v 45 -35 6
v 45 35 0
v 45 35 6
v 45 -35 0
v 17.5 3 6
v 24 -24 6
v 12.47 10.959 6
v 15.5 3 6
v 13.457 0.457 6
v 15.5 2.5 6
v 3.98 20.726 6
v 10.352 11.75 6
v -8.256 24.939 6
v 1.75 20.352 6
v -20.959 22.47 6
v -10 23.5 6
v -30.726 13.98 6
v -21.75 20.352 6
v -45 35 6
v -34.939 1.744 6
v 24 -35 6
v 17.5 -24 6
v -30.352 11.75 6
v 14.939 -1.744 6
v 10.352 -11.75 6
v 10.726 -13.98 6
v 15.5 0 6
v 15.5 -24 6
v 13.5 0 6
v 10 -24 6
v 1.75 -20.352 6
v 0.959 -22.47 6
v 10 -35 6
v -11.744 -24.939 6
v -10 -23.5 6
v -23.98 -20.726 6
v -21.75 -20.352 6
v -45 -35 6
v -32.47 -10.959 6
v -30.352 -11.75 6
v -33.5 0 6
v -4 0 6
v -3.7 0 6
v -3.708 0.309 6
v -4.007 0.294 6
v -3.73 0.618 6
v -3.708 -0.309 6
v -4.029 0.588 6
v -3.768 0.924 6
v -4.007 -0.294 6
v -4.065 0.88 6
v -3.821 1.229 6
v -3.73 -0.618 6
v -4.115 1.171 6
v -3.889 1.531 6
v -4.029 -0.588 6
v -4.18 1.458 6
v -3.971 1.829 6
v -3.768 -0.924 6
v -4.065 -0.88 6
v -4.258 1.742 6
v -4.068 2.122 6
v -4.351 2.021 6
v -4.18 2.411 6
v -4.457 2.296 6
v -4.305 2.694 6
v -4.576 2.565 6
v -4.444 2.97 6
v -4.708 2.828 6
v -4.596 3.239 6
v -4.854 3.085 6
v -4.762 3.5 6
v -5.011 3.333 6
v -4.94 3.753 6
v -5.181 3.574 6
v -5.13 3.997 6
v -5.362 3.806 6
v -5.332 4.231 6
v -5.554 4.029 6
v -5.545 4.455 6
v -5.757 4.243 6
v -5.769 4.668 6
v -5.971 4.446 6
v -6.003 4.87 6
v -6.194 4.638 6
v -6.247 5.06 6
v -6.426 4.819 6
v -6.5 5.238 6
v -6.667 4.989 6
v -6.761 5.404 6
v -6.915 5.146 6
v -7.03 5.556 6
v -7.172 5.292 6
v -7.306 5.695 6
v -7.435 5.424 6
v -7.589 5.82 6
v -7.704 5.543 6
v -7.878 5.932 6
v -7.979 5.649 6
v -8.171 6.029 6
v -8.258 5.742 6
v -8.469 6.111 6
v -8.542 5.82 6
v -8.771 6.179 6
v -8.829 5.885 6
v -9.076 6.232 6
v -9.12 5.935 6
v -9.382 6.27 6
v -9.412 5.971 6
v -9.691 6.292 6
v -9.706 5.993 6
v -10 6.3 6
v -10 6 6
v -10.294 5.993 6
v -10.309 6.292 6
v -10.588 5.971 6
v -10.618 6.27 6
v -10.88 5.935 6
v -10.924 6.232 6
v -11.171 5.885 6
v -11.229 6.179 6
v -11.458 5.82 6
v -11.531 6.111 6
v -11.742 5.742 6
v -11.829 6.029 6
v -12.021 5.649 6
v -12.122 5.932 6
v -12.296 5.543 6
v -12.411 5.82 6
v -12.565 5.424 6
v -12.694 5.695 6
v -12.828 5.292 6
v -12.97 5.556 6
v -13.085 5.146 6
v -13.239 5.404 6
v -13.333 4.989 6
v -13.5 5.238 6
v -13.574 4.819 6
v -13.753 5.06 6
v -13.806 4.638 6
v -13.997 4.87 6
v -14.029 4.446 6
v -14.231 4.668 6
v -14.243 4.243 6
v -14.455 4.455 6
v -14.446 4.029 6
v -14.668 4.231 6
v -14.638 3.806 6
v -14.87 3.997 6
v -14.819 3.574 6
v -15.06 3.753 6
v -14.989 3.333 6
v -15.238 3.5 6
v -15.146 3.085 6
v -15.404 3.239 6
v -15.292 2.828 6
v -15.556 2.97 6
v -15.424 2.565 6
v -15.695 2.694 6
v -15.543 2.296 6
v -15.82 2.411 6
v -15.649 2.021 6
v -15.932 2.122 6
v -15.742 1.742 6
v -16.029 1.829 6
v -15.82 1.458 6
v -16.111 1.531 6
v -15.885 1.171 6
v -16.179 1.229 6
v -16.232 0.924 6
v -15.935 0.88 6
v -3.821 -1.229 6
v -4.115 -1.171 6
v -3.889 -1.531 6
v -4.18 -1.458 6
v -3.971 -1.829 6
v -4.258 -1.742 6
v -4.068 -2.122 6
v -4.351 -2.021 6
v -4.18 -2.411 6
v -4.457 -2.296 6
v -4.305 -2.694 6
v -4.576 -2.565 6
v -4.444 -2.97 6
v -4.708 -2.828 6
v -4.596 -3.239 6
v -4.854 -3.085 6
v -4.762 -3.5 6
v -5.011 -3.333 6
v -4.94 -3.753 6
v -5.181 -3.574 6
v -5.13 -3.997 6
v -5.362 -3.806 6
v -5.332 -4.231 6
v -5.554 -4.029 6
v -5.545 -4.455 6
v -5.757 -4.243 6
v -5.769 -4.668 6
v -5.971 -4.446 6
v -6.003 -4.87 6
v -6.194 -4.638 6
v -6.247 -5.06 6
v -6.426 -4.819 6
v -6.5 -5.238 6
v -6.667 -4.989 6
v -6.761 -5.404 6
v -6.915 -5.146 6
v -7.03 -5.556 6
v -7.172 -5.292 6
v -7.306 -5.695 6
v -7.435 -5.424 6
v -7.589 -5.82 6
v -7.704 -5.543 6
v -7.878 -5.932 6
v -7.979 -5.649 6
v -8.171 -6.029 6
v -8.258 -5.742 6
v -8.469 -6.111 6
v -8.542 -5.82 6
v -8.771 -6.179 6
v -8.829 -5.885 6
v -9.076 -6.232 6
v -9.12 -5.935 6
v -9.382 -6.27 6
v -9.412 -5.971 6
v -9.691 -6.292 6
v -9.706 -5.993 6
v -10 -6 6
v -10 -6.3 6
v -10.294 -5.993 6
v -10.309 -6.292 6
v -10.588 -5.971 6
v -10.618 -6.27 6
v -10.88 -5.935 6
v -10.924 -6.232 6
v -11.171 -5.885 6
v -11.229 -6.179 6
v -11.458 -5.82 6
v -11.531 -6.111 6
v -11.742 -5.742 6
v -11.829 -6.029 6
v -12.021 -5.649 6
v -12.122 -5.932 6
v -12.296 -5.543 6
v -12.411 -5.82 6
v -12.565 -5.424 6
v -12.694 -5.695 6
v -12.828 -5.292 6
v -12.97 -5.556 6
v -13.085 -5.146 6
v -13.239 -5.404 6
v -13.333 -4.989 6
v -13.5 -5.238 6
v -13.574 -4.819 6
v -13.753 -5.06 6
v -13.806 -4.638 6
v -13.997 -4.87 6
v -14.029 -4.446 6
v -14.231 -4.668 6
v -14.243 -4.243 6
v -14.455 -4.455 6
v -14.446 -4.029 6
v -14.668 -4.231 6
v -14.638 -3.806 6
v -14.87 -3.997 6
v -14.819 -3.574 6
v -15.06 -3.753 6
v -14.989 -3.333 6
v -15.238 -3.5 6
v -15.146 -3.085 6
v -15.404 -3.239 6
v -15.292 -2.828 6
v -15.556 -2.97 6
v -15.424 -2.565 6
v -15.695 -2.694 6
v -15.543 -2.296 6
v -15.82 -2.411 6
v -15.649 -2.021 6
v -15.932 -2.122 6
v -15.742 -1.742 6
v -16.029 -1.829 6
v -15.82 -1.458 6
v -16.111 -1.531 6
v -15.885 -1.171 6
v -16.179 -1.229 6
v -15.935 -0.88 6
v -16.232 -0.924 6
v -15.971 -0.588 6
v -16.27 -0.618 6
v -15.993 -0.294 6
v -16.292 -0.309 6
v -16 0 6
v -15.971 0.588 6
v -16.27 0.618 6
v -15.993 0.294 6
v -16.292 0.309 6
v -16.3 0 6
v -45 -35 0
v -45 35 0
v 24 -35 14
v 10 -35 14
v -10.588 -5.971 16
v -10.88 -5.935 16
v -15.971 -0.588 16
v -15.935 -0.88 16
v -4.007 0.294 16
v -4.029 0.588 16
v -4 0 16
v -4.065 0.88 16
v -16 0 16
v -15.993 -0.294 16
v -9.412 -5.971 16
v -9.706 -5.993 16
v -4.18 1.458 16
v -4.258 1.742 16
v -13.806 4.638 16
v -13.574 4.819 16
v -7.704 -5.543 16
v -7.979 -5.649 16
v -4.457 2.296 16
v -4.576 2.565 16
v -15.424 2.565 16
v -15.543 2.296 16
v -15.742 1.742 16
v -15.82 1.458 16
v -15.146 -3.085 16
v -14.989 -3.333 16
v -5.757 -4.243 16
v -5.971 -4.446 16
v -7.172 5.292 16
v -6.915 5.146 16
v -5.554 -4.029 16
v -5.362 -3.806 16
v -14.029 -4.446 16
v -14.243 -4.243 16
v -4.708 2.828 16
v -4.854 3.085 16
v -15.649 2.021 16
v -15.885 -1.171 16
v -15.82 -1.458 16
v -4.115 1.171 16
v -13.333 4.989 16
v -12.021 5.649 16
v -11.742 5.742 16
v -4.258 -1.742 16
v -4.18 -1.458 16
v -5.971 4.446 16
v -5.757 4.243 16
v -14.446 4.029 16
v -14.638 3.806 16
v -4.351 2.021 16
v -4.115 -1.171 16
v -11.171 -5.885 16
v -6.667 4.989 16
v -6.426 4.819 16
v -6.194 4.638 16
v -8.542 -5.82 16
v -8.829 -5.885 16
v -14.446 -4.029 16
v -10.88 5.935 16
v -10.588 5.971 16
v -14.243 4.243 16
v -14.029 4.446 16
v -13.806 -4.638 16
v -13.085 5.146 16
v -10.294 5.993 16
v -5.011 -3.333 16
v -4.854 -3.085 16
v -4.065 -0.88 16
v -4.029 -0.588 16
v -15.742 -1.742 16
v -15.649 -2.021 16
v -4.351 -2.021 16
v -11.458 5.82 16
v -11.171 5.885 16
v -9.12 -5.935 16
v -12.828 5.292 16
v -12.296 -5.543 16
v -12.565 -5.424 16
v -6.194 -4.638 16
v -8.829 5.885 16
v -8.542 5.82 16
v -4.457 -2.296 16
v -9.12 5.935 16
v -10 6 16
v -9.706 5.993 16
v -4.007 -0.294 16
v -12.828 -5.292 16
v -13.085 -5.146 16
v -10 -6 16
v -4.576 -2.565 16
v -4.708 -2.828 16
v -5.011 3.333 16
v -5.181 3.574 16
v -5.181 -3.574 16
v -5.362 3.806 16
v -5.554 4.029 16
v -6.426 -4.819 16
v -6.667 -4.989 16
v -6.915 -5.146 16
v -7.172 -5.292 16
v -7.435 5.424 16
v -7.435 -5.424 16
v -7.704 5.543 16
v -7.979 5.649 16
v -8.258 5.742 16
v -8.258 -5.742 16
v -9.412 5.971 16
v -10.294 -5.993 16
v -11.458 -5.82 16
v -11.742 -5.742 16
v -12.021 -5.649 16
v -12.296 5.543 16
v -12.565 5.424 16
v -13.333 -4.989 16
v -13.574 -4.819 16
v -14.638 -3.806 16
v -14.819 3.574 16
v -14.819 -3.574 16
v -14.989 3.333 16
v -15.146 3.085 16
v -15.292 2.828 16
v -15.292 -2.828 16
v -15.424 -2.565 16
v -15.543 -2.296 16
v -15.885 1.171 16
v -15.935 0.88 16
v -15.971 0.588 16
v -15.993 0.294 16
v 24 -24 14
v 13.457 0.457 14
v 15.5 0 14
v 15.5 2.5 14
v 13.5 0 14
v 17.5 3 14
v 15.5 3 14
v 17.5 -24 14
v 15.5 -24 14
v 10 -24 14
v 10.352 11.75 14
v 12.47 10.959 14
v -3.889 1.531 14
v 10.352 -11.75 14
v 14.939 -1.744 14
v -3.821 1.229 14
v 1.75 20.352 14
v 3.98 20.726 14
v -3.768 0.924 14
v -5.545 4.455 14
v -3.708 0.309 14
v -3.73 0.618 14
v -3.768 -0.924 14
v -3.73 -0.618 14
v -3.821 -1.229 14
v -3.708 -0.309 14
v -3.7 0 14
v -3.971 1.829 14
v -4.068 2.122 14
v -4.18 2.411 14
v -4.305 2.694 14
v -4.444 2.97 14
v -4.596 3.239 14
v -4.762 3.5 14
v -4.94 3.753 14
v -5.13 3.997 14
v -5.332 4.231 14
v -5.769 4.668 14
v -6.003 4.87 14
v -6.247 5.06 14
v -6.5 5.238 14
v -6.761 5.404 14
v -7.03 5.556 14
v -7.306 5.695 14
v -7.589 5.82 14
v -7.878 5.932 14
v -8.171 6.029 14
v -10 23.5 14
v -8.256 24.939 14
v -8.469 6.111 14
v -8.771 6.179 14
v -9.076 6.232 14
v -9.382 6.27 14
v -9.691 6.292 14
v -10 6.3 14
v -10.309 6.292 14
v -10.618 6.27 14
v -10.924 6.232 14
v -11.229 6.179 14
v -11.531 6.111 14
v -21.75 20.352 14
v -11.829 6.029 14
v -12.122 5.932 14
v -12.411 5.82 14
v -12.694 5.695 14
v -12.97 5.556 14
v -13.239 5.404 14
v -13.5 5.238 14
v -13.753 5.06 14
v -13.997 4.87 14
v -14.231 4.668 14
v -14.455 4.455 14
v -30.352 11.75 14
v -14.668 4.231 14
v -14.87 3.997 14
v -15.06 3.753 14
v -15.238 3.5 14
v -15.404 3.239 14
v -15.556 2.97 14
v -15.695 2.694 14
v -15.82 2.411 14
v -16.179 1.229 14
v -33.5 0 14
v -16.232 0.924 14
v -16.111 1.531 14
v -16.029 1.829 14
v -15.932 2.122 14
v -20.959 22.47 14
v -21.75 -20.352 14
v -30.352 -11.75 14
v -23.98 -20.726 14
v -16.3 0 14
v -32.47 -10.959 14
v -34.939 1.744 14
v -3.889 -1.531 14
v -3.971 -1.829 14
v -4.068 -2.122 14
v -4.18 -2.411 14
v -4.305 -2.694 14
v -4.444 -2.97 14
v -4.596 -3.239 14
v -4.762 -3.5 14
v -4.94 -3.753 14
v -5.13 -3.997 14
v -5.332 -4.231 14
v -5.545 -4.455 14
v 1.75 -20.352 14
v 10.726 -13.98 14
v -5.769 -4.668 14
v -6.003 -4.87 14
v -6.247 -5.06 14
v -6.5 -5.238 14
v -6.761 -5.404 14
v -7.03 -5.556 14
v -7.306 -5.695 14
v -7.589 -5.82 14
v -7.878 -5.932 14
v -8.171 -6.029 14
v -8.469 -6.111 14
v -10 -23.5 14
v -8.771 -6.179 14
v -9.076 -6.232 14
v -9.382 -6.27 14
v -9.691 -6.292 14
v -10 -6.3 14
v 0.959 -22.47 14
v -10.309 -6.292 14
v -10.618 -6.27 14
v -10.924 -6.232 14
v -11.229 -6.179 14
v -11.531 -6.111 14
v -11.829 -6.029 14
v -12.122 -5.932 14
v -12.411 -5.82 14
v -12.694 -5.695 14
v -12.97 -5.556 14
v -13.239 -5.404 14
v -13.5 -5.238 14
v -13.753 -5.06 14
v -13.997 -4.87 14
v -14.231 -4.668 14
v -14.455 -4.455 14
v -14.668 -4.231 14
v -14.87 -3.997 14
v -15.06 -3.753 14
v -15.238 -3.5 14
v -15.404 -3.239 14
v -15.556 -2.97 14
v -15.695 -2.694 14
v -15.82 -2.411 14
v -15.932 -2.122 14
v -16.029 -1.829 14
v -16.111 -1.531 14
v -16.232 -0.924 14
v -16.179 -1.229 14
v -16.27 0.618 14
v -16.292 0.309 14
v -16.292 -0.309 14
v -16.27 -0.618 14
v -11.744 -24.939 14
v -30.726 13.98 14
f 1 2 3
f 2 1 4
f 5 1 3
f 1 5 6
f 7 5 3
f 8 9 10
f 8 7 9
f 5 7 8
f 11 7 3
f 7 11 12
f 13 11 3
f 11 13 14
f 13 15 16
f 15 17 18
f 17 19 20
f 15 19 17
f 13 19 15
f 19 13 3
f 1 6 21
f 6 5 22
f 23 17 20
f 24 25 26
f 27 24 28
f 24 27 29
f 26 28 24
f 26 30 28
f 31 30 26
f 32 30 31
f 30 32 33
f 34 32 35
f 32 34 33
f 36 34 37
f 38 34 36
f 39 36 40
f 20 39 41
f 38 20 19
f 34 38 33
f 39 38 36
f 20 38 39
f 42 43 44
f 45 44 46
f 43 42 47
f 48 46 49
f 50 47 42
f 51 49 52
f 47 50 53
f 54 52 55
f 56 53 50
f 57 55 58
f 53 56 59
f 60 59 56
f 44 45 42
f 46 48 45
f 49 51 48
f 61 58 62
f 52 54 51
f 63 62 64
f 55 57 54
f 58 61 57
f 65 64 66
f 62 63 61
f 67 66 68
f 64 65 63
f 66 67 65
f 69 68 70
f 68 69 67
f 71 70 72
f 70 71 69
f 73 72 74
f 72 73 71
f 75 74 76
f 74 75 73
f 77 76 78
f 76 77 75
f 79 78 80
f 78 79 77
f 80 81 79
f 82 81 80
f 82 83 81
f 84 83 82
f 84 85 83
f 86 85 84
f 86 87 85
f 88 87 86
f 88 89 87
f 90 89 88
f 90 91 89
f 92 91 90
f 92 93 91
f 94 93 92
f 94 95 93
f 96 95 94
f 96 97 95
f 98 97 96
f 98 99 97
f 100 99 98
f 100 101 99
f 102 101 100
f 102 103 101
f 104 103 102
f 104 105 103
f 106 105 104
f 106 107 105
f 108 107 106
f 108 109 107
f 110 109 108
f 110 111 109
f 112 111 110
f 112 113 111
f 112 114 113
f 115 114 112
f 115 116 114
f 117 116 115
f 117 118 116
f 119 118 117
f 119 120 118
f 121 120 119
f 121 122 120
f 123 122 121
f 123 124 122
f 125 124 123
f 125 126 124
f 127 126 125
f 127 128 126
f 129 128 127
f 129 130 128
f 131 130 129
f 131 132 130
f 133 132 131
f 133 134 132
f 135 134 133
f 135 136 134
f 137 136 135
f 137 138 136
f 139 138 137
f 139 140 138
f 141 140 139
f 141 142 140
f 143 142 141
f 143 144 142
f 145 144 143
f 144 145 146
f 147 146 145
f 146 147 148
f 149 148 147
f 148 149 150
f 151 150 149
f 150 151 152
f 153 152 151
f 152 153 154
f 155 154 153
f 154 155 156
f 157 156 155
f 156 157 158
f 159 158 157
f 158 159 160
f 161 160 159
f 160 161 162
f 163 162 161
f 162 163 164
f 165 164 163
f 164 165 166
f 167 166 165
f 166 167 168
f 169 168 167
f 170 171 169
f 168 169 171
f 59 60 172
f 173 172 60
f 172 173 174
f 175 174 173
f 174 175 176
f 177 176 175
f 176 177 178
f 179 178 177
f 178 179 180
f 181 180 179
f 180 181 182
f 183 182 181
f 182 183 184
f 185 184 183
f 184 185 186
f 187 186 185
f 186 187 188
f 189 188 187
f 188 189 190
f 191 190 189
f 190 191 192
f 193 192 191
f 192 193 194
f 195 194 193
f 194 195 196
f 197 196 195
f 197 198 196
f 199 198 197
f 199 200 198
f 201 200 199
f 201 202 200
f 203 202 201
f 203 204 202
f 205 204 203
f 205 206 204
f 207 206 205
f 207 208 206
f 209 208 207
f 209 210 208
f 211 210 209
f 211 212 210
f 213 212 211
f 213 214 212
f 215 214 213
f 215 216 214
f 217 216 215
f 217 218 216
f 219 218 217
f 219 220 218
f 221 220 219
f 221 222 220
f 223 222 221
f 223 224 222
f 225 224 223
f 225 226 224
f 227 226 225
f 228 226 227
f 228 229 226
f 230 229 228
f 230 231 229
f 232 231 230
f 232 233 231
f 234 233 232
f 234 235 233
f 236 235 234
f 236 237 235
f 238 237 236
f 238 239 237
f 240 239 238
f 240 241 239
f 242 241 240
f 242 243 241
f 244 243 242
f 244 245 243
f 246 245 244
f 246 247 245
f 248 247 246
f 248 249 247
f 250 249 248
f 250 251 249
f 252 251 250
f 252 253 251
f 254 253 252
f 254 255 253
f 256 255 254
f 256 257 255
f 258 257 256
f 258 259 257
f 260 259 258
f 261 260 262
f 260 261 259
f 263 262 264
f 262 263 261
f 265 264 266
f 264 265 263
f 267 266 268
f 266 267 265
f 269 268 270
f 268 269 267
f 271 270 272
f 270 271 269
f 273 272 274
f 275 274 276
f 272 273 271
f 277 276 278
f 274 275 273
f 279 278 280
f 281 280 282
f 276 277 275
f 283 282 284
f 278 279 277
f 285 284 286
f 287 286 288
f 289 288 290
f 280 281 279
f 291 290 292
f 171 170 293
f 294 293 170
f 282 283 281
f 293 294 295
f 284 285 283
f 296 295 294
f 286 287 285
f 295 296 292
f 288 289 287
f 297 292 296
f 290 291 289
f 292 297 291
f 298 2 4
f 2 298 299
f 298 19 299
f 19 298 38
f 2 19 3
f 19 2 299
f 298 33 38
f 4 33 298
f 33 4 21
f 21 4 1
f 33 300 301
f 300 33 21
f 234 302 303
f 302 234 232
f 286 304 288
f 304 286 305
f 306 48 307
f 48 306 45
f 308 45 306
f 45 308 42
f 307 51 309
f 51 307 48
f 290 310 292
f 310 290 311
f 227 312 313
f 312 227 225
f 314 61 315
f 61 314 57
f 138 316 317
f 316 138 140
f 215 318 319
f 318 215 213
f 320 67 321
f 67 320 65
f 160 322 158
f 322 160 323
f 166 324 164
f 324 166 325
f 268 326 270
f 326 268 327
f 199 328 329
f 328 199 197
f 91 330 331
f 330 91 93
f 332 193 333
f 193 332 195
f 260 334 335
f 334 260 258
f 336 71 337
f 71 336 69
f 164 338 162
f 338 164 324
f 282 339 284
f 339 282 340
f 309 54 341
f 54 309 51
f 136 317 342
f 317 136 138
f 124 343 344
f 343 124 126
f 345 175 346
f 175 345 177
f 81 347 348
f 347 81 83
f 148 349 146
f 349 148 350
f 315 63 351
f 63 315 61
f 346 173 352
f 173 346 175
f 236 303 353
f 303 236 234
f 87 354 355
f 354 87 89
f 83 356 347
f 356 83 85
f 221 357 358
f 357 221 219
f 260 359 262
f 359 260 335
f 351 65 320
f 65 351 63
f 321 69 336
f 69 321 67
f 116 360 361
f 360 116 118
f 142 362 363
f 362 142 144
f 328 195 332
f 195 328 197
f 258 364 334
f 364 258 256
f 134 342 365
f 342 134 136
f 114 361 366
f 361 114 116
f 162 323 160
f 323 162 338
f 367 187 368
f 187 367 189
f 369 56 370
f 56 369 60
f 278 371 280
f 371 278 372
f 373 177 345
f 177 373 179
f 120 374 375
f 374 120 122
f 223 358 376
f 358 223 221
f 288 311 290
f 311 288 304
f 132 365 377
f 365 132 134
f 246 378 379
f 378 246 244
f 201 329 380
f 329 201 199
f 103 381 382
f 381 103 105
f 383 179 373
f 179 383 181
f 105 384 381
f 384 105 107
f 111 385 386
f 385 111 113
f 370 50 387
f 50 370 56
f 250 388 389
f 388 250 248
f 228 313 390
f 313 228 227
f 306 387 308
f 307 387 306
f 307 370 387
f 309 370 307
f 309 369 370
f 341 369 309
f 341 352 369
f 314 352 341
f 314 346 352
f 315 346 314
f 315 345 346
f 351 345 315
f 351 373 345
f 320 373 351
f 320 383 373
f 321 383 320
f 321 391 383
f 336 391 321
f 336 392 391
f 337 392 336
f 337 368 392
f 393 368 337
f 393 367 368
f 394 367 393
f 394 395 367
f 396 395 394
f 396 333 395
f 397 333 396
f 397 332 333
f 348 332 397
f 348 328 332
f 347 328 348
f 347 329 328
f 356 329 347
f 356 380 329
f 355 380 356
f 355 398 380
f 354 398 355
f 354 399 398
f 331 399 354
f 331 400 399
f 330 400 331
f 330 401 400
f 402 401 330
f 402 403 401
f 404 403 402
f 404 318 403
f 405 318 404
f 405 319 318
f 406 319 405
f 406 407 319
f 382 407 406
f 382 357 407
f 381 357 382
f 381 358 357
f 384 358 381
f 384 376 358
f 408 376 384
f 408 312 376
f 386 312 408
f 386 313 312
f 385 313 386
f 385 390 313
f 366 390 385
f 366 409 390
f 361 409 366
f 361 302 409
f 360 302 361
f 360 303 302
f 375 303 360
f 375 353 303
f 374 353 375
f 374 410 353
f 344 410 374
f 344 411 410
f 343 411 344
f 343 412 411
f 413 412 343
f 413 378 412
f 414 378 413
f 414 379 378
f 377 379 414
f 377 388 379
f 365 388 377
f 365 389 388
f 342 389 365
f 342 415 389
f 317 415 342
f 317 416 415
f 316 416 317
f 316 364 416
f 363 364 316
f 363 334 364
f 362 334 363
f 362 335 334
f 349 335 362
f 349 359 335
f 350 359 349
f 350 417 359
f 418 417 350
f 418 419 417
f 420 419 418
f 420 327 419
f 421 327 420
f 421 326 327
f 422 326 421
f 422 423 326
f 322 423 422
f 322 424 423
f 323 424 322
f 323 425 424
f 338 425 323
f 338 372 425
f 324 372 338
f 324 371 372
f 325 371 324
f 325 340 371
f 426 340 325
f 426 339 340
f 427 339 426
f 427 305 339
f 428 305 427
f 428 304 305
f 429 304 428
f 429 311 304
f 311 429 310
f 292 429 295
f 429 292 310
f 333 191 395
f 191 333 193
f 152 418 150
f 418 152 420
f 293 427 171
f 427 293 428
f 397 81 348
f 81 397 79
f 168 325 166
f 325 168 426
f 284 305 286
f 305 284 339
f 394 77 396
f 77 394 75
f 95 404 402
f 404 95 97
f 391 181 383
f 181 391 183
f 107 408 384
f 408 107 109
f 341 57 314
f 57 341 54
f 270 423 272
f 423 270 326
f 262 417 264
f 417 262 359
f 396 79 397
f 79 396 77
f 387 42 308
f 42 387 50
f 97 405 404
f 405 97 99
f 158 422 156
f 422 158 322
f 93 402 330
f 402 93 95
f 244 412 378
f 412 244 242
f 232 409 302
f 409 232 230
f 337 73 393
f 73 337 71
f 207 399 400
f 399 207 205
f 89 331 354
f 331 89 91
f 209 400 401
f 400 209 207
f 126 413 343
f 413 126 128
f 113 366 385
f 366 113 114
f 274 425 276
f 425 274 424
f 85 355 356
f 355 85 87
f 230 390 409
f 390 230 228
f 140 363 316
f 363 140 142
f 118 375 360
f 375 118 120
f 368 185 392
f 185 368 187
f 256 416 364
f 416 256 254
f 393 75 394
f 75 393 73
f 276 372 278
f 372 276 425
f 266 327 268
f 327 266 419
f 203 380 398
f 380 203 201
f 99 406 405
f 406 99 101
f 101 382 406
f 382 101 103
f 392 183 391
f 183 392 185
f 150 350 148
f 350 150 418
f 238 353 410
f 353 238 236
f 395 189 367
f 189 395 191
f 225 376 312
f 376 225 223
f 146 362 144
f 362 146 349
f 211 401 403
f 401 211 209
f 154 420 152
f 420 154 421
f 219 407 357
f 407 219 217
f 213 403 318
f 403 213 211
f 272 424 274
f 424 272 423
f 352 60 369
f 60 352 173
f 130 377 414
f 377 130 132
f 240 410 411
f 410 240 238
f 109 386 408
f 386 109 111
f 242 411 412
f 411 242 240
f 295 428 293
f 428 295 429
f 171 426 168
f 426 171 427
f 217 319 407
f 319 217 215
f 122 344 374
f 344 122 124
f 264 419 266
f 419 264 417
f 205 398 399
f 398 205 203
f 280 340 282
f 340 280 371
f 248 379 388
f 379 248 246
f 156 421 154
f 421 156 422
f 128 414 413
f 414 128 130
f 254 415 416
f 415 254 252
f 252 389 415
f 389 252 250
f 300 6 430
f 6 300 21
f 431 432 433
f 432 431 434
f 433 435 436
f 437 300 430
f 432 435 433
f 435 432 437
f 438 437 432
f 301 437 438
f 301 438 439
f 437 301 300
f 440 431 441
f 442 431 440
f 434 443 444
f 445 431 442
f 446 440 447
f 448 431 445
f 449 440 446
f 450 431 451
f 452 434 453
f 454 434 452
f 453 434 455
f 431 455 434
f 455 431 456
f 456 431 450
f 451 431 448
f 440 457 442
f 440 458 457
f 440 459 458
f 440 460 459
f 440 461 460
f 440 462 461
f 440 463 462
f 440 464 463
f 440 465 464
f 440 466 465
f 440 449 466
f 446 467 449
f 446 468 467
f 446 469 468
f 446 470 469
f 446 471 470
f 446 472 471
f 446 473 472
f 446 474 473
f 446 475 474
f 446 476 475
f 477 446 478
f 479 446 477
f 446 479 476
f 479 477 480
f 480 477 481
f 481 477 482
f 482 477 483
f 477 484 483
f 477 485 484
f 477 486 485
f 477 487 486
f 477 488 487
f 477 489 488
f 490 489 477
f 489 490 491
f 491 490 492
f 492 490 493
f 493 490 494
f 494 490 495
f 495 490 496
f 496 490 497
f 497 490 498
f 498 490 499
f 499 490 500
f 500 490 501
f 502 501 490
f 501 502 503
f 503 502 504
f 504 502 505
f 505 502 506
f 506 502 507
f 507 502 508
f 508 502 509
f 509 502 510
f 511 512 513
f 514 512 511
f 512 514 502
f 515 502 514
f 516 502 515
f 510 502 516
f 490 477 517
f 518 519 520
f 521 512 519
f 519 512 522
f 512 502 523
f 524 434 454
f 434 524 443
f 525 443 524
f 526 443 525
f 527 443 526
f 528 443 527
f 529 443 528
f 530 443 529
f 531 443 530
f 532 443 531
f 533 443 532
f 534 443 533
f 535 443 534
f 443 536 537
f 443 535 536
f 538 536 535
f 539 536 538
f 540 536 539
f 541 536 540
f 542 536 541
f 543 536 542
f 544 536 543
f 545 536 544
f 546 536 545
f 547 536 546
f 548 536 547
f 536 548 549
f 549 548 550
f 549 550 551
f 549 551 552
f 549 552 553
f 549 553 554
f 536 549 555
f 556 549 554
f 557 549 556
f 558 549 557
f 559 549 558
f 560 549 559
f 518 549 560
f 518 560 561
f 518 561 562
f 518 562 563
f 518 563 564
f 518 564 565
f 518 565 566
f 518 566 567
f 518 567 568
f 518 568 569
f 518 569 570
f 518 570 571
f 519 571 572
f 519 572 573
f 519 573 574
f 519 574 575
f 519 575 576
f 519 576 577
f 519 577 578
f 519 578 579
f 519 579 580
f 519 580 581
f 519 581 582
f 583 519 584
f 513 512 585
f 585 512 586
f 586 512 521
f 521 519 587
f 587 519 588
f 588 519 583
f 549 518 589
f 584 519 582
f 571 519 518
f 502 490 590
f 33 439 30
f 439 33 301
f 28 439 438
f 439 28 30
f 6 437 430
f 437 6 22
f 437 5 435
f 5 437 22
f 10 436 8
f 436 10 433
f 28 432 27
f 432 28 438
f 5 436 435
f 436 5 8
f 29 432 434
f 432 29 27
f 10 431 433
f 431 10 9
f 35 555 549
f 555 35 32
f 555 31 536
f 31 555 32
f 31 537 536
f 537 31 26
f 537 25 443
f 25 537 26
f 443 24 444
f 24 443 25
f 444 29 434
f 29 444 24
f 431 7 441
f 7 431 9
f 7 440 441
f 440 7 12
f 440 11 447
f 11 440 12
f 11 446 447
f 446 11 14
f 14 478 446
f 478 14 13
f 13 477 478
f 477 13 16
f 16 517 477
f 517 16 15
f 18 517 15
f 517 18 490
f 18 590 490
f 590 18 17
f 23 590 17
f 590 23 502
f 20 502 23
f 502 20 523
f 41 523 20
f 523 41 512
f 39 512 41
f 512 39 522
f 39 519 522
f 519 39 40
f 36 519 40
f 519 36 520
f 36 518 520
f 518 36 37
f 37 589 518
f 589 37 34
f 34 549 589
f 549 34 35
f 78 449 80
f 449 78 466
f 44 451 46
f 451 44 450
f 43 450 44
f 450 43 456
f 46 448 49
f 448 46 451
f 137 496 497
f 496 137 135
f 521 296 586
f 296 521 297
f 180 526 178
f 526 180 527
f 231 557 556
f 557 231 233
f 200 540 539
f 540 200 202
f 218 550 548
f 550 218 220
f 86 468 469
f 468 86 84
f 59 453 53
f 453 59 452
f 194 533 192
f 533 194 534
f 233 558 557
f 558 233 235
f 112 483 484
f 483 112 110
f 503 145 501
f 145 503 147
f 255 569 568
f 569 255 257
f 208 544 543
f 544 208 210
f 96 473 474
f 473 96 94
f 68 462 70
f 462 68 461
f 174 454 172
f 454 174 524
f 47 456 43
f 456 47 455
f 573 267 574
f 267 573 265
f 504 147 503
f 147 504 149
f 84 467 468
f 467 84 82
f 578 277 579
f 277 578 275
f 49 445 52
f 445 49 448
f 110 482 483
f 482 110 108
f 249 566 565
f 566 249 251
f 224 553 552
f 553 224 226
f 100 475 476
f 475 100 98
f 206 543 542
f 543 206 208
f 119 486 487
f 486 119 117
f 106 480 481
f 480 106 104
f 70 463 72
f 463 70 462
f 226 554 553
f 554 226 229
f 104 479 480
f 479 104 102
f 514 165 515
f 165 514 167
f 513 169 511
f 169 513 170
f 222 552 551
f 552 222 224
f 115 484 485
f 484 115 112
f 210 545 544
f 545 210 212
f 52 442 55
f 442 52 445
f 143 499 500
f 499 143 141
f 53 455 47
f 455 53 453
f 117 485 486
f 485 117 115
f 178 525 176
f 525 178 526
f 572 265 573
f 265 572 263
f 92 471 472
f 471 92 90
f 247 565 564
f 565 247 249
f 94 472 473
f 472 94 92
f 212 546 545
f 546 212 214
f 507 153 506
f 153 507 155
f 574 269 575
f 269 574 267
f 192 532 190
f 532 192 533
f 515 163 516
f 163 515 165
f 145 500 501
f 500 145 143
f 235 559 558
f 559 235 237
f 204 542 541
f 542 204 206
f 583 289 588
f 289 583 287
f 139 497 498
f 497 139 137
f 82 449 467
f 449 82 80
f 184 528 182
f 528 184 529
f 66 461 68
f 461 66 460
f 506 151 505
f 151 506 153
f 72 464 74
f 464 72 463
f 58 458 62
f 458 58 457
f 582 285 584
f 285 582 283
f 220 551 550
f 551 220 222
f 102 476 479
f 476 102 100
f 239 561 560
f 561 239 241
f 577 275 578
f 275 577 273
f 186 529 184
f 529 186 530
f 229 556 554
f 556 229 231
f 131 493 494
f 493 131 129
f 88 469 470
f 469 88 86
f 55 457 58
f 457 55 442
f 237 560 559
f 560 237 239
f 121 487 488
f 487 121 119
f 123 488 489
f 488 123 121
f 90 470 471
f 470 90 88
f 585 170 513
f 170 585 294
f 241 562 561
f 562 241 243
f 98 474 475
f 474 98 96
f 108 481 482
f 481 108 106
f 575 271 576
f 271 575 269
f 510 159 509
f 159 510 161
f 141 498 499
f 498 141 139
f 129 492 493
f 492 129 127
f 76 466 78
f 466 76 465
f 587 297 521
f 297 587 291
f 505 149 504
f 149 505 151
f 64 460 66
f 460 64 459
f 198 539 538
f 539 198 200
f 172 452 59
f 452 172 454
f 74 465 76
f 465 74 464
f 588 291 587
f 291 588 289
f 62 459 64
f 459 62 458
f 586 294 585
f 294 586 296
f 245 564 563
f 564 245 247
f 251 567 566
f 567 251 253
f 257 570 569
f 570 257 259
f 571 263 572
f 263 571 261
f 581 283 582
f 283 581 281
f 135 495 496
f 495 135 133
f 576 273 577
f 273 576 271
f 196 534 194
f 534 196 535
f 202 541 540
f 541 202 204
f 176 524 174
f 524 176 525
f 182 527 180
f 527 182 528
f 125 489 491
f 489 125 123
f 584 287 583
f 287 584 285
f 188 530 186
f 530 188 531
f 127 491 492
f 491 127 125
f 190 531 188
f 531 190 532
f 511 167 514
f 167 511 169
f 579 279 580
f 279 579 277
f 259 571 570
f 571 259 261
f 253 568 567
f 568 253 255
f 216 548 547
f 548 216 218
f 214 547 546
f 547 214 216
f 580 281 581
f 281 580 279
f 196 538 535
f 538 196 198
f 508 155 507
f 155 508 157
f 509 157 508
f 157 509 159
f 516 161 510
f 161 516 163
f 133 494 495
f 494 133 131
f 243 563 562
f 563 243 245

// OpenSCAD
/* Ratchet wheel with spring pawl - PLA, 0.4 nozzle, no supports */
// Wheel ~50mm dia, 12 teeth. Free clockwise (from above), locks CCW.
// Print orientation: both parts flat, +Z up, bottom on bed.

/* [Part] */
part = "assembly"; // [wheel, base, assembly]
cadverify_only = "";
module instance(name, part, unit = 1) {
    echo(cadverify_instance = [name, part, unit]);
    if (cadverify_only == "" || cadverify_only == name) children();
}

// ---- parameters (mm) ----
Ro = 25;            // wheel tip radius (dia 50)
Rr = 23.5;          // wheel root radius (tooth height 1.5)
Nteeth = 12;
pitch = 360/Nteeth; // 30
gentle_span = 26;   // valley->tip CCW (gentle ramp)
wheel_t = 8;        // wheel thickness
bore_d = 12.6;      // wheel bore
post_d = 12;        // post diameter
post_h = 10;        // post height above base top
base_x = 90;
base_y = 70;
base_t = 6;
wheel_cx = -10;     // post/wheel centre in base coords
wheel_cy = 0;
base_top = base_t;  // 6
// pawl / arm
beam_x0 = 15.5; beam_x1 = 17.5;   // beam 2mm thick in X
beam_y0 = -30; beam_y1 = 3;       // beam length
beam_z0 = 6; beam_z1 = 14;        // beam height 8
tip_x = 13.0;       // pawl tip westmost (2.0 inside tip circle: engagement depth test)

$fn = 128;

// ---- wheel: centred at (0,0), bottom z=0 ----
module wheel() {
    difference() {
        linear_extrude(height = wheel_t, convexity = 4)
            polygon(points = [ for (i = [0:Nteeth-1]) each [
                [Rr*cos(i*pitch), Rr*sin(i*pitch)],
                [Ro*cos(i*pitch+gentle_span), Ro*sin(i*pitch+gentle_span)]
            ]]);
        translate([0,0,-1]) cylinder(d = bore_d, h = wheel_t+2);
    }
}

// ---- base: plate centred at origin, bottom z=0, post at (wheel_cx,wheel_cy) ----
module base() {
    union() {
        // plate
        translate([-base_x/2, -base_y/2, 0]) cube([base_x, base_y, base_t]);
        // post
        translate([wheel_cx, wheel_cy, base_top]) cylinder(d = post_d, h = post_h);
        // anchor block
        translate([10, -35, 6]) cube([14, 11, 8]);
        // flexible beam (2mm thick, ~33mm long, 8mm tall)
        translate([beam_x0, beam_y0, beam_z0]) cube([beam_x1-beam_x0, beam_y1-beam_y0, beam_z1-beam_z0]);
        // pawl tip wedge: tip (tip_x,0), overlap 0.5 into beam; north ramp, south flat
        linear_extrude(height = 8, convexity = 2)
            polygon(points = [[tip_x,0],[16,0],[16,3]]);
        // shift pawl wedge up to beam height (extrude from 0 -> translate)
    }
}

// pawl wedge is extruded 0..8, need to lift to 6..14: wrap
module base_fixed() {
    union() {
        translate([-base_x/2, -base_y/2, 0]) cube([base_x, base_y, base_t]);
        translate([wheel_cx, wheel_cy, base_top]) cylinder(d = post_d, h = post_h);
        translate([10, -35, 6]) cube([14, 11, 8]);
        translate([beam_x0, beam_y0, beam_z0]) cube([beam_x1-beam_x0, beam_y1-beam_y0, beam_z1-beam_z0]);
        translate([0,0,6]) linear_extrude(height = 8, convexity = 2)
            polygon(points = [[tip_x,0],[16,0],[16,3]]);
    }
}

// ---- specs ----
if (part == "wheel") echo(cadverify_spec = [
    ["bounds", [[-Ro, -Ro, 0], [Ro, Ro, wheel_t]]],
    ["bodies", 1],
    ["through_holes", 1],
    ["support_faces", [["bed", "-z", 1000]]],
    ["overhangs_allowed", []],
    ["copies", 1],
    ["details", [
        ["bore", "hole", [0, 0, 10], [0, 0, -1], [[0, bore_d], [wheel_t, bore_d]]],
        ["rim", "thickness", [0, 15, 10], [0, 0, -1], wheel_t],
        ["tooth", "material", [[11, -1, 0], [14, 2, wheel_t]], 0.5],
        ["teeth", "view", [[20, -25, 0], [Ro, 25, wheel_t]]]
    ]]
]);

if (part == "base") echo(cadverify_spec = [
    ["bounds", [[-base_x/2, -base_y/2, 0], [base_x/2, base_y/2, base_top+post_h]]],
    ["bodies", 1],
    ["support_faces", [["bed", "-z", 4000]]],
    ["overhangs_allowed", []],
    ["copies", 1],
    ["details", [
        ["plate", "thickness", [-30, 20, 10], [0, 0, -1], base_t],
        ["post", "material", [[wheel_cx-6, wheel_cy-6, base_top], [wheel_cx+6, wheel_cy+6, base_top+post_h]], 0.5],
        ["arm", "material", [[beam_x0, beam_y0, beam_z0], [beam_x1, beam_y1, beam_z1]], 0.9],
        ["pawl_tip", "view", [[14.0, -1, 6], [16, 3.5, 14]]]
    ]]
]);

if (part == "assembly") echo(cadverify_spec = [
    ["bounds", [[-base_x/2, -base_y/2, 0], [base_x/2, base_y/2, base_top+post_h]]],
    ["motions", [
        ["click", ["wheel1"], "rotate", [wheel_cx, wheel_cy, base_top], [0, 0, 1], [0, -360],
            ["flex", [["wheel1", "base1", 1.0, "pawl flexes over teeth"]]]]
    ]],
    ["assembly_order", [
        [["base1"], [0, 0, 0]],
        [["wheel1"], [0, 0, -30]]
    ]]
]);

// ---- geometry dispatch ----
if (part == "wheel") wheel();
else if (part == "base") base_fixed();
else if (part == "assembly") {
    instance("base1", "base") base_fixed();
    instance("wheel1", "wheel") translate([wheel_cx, wheel_cy, base_top]) wheel();
}
